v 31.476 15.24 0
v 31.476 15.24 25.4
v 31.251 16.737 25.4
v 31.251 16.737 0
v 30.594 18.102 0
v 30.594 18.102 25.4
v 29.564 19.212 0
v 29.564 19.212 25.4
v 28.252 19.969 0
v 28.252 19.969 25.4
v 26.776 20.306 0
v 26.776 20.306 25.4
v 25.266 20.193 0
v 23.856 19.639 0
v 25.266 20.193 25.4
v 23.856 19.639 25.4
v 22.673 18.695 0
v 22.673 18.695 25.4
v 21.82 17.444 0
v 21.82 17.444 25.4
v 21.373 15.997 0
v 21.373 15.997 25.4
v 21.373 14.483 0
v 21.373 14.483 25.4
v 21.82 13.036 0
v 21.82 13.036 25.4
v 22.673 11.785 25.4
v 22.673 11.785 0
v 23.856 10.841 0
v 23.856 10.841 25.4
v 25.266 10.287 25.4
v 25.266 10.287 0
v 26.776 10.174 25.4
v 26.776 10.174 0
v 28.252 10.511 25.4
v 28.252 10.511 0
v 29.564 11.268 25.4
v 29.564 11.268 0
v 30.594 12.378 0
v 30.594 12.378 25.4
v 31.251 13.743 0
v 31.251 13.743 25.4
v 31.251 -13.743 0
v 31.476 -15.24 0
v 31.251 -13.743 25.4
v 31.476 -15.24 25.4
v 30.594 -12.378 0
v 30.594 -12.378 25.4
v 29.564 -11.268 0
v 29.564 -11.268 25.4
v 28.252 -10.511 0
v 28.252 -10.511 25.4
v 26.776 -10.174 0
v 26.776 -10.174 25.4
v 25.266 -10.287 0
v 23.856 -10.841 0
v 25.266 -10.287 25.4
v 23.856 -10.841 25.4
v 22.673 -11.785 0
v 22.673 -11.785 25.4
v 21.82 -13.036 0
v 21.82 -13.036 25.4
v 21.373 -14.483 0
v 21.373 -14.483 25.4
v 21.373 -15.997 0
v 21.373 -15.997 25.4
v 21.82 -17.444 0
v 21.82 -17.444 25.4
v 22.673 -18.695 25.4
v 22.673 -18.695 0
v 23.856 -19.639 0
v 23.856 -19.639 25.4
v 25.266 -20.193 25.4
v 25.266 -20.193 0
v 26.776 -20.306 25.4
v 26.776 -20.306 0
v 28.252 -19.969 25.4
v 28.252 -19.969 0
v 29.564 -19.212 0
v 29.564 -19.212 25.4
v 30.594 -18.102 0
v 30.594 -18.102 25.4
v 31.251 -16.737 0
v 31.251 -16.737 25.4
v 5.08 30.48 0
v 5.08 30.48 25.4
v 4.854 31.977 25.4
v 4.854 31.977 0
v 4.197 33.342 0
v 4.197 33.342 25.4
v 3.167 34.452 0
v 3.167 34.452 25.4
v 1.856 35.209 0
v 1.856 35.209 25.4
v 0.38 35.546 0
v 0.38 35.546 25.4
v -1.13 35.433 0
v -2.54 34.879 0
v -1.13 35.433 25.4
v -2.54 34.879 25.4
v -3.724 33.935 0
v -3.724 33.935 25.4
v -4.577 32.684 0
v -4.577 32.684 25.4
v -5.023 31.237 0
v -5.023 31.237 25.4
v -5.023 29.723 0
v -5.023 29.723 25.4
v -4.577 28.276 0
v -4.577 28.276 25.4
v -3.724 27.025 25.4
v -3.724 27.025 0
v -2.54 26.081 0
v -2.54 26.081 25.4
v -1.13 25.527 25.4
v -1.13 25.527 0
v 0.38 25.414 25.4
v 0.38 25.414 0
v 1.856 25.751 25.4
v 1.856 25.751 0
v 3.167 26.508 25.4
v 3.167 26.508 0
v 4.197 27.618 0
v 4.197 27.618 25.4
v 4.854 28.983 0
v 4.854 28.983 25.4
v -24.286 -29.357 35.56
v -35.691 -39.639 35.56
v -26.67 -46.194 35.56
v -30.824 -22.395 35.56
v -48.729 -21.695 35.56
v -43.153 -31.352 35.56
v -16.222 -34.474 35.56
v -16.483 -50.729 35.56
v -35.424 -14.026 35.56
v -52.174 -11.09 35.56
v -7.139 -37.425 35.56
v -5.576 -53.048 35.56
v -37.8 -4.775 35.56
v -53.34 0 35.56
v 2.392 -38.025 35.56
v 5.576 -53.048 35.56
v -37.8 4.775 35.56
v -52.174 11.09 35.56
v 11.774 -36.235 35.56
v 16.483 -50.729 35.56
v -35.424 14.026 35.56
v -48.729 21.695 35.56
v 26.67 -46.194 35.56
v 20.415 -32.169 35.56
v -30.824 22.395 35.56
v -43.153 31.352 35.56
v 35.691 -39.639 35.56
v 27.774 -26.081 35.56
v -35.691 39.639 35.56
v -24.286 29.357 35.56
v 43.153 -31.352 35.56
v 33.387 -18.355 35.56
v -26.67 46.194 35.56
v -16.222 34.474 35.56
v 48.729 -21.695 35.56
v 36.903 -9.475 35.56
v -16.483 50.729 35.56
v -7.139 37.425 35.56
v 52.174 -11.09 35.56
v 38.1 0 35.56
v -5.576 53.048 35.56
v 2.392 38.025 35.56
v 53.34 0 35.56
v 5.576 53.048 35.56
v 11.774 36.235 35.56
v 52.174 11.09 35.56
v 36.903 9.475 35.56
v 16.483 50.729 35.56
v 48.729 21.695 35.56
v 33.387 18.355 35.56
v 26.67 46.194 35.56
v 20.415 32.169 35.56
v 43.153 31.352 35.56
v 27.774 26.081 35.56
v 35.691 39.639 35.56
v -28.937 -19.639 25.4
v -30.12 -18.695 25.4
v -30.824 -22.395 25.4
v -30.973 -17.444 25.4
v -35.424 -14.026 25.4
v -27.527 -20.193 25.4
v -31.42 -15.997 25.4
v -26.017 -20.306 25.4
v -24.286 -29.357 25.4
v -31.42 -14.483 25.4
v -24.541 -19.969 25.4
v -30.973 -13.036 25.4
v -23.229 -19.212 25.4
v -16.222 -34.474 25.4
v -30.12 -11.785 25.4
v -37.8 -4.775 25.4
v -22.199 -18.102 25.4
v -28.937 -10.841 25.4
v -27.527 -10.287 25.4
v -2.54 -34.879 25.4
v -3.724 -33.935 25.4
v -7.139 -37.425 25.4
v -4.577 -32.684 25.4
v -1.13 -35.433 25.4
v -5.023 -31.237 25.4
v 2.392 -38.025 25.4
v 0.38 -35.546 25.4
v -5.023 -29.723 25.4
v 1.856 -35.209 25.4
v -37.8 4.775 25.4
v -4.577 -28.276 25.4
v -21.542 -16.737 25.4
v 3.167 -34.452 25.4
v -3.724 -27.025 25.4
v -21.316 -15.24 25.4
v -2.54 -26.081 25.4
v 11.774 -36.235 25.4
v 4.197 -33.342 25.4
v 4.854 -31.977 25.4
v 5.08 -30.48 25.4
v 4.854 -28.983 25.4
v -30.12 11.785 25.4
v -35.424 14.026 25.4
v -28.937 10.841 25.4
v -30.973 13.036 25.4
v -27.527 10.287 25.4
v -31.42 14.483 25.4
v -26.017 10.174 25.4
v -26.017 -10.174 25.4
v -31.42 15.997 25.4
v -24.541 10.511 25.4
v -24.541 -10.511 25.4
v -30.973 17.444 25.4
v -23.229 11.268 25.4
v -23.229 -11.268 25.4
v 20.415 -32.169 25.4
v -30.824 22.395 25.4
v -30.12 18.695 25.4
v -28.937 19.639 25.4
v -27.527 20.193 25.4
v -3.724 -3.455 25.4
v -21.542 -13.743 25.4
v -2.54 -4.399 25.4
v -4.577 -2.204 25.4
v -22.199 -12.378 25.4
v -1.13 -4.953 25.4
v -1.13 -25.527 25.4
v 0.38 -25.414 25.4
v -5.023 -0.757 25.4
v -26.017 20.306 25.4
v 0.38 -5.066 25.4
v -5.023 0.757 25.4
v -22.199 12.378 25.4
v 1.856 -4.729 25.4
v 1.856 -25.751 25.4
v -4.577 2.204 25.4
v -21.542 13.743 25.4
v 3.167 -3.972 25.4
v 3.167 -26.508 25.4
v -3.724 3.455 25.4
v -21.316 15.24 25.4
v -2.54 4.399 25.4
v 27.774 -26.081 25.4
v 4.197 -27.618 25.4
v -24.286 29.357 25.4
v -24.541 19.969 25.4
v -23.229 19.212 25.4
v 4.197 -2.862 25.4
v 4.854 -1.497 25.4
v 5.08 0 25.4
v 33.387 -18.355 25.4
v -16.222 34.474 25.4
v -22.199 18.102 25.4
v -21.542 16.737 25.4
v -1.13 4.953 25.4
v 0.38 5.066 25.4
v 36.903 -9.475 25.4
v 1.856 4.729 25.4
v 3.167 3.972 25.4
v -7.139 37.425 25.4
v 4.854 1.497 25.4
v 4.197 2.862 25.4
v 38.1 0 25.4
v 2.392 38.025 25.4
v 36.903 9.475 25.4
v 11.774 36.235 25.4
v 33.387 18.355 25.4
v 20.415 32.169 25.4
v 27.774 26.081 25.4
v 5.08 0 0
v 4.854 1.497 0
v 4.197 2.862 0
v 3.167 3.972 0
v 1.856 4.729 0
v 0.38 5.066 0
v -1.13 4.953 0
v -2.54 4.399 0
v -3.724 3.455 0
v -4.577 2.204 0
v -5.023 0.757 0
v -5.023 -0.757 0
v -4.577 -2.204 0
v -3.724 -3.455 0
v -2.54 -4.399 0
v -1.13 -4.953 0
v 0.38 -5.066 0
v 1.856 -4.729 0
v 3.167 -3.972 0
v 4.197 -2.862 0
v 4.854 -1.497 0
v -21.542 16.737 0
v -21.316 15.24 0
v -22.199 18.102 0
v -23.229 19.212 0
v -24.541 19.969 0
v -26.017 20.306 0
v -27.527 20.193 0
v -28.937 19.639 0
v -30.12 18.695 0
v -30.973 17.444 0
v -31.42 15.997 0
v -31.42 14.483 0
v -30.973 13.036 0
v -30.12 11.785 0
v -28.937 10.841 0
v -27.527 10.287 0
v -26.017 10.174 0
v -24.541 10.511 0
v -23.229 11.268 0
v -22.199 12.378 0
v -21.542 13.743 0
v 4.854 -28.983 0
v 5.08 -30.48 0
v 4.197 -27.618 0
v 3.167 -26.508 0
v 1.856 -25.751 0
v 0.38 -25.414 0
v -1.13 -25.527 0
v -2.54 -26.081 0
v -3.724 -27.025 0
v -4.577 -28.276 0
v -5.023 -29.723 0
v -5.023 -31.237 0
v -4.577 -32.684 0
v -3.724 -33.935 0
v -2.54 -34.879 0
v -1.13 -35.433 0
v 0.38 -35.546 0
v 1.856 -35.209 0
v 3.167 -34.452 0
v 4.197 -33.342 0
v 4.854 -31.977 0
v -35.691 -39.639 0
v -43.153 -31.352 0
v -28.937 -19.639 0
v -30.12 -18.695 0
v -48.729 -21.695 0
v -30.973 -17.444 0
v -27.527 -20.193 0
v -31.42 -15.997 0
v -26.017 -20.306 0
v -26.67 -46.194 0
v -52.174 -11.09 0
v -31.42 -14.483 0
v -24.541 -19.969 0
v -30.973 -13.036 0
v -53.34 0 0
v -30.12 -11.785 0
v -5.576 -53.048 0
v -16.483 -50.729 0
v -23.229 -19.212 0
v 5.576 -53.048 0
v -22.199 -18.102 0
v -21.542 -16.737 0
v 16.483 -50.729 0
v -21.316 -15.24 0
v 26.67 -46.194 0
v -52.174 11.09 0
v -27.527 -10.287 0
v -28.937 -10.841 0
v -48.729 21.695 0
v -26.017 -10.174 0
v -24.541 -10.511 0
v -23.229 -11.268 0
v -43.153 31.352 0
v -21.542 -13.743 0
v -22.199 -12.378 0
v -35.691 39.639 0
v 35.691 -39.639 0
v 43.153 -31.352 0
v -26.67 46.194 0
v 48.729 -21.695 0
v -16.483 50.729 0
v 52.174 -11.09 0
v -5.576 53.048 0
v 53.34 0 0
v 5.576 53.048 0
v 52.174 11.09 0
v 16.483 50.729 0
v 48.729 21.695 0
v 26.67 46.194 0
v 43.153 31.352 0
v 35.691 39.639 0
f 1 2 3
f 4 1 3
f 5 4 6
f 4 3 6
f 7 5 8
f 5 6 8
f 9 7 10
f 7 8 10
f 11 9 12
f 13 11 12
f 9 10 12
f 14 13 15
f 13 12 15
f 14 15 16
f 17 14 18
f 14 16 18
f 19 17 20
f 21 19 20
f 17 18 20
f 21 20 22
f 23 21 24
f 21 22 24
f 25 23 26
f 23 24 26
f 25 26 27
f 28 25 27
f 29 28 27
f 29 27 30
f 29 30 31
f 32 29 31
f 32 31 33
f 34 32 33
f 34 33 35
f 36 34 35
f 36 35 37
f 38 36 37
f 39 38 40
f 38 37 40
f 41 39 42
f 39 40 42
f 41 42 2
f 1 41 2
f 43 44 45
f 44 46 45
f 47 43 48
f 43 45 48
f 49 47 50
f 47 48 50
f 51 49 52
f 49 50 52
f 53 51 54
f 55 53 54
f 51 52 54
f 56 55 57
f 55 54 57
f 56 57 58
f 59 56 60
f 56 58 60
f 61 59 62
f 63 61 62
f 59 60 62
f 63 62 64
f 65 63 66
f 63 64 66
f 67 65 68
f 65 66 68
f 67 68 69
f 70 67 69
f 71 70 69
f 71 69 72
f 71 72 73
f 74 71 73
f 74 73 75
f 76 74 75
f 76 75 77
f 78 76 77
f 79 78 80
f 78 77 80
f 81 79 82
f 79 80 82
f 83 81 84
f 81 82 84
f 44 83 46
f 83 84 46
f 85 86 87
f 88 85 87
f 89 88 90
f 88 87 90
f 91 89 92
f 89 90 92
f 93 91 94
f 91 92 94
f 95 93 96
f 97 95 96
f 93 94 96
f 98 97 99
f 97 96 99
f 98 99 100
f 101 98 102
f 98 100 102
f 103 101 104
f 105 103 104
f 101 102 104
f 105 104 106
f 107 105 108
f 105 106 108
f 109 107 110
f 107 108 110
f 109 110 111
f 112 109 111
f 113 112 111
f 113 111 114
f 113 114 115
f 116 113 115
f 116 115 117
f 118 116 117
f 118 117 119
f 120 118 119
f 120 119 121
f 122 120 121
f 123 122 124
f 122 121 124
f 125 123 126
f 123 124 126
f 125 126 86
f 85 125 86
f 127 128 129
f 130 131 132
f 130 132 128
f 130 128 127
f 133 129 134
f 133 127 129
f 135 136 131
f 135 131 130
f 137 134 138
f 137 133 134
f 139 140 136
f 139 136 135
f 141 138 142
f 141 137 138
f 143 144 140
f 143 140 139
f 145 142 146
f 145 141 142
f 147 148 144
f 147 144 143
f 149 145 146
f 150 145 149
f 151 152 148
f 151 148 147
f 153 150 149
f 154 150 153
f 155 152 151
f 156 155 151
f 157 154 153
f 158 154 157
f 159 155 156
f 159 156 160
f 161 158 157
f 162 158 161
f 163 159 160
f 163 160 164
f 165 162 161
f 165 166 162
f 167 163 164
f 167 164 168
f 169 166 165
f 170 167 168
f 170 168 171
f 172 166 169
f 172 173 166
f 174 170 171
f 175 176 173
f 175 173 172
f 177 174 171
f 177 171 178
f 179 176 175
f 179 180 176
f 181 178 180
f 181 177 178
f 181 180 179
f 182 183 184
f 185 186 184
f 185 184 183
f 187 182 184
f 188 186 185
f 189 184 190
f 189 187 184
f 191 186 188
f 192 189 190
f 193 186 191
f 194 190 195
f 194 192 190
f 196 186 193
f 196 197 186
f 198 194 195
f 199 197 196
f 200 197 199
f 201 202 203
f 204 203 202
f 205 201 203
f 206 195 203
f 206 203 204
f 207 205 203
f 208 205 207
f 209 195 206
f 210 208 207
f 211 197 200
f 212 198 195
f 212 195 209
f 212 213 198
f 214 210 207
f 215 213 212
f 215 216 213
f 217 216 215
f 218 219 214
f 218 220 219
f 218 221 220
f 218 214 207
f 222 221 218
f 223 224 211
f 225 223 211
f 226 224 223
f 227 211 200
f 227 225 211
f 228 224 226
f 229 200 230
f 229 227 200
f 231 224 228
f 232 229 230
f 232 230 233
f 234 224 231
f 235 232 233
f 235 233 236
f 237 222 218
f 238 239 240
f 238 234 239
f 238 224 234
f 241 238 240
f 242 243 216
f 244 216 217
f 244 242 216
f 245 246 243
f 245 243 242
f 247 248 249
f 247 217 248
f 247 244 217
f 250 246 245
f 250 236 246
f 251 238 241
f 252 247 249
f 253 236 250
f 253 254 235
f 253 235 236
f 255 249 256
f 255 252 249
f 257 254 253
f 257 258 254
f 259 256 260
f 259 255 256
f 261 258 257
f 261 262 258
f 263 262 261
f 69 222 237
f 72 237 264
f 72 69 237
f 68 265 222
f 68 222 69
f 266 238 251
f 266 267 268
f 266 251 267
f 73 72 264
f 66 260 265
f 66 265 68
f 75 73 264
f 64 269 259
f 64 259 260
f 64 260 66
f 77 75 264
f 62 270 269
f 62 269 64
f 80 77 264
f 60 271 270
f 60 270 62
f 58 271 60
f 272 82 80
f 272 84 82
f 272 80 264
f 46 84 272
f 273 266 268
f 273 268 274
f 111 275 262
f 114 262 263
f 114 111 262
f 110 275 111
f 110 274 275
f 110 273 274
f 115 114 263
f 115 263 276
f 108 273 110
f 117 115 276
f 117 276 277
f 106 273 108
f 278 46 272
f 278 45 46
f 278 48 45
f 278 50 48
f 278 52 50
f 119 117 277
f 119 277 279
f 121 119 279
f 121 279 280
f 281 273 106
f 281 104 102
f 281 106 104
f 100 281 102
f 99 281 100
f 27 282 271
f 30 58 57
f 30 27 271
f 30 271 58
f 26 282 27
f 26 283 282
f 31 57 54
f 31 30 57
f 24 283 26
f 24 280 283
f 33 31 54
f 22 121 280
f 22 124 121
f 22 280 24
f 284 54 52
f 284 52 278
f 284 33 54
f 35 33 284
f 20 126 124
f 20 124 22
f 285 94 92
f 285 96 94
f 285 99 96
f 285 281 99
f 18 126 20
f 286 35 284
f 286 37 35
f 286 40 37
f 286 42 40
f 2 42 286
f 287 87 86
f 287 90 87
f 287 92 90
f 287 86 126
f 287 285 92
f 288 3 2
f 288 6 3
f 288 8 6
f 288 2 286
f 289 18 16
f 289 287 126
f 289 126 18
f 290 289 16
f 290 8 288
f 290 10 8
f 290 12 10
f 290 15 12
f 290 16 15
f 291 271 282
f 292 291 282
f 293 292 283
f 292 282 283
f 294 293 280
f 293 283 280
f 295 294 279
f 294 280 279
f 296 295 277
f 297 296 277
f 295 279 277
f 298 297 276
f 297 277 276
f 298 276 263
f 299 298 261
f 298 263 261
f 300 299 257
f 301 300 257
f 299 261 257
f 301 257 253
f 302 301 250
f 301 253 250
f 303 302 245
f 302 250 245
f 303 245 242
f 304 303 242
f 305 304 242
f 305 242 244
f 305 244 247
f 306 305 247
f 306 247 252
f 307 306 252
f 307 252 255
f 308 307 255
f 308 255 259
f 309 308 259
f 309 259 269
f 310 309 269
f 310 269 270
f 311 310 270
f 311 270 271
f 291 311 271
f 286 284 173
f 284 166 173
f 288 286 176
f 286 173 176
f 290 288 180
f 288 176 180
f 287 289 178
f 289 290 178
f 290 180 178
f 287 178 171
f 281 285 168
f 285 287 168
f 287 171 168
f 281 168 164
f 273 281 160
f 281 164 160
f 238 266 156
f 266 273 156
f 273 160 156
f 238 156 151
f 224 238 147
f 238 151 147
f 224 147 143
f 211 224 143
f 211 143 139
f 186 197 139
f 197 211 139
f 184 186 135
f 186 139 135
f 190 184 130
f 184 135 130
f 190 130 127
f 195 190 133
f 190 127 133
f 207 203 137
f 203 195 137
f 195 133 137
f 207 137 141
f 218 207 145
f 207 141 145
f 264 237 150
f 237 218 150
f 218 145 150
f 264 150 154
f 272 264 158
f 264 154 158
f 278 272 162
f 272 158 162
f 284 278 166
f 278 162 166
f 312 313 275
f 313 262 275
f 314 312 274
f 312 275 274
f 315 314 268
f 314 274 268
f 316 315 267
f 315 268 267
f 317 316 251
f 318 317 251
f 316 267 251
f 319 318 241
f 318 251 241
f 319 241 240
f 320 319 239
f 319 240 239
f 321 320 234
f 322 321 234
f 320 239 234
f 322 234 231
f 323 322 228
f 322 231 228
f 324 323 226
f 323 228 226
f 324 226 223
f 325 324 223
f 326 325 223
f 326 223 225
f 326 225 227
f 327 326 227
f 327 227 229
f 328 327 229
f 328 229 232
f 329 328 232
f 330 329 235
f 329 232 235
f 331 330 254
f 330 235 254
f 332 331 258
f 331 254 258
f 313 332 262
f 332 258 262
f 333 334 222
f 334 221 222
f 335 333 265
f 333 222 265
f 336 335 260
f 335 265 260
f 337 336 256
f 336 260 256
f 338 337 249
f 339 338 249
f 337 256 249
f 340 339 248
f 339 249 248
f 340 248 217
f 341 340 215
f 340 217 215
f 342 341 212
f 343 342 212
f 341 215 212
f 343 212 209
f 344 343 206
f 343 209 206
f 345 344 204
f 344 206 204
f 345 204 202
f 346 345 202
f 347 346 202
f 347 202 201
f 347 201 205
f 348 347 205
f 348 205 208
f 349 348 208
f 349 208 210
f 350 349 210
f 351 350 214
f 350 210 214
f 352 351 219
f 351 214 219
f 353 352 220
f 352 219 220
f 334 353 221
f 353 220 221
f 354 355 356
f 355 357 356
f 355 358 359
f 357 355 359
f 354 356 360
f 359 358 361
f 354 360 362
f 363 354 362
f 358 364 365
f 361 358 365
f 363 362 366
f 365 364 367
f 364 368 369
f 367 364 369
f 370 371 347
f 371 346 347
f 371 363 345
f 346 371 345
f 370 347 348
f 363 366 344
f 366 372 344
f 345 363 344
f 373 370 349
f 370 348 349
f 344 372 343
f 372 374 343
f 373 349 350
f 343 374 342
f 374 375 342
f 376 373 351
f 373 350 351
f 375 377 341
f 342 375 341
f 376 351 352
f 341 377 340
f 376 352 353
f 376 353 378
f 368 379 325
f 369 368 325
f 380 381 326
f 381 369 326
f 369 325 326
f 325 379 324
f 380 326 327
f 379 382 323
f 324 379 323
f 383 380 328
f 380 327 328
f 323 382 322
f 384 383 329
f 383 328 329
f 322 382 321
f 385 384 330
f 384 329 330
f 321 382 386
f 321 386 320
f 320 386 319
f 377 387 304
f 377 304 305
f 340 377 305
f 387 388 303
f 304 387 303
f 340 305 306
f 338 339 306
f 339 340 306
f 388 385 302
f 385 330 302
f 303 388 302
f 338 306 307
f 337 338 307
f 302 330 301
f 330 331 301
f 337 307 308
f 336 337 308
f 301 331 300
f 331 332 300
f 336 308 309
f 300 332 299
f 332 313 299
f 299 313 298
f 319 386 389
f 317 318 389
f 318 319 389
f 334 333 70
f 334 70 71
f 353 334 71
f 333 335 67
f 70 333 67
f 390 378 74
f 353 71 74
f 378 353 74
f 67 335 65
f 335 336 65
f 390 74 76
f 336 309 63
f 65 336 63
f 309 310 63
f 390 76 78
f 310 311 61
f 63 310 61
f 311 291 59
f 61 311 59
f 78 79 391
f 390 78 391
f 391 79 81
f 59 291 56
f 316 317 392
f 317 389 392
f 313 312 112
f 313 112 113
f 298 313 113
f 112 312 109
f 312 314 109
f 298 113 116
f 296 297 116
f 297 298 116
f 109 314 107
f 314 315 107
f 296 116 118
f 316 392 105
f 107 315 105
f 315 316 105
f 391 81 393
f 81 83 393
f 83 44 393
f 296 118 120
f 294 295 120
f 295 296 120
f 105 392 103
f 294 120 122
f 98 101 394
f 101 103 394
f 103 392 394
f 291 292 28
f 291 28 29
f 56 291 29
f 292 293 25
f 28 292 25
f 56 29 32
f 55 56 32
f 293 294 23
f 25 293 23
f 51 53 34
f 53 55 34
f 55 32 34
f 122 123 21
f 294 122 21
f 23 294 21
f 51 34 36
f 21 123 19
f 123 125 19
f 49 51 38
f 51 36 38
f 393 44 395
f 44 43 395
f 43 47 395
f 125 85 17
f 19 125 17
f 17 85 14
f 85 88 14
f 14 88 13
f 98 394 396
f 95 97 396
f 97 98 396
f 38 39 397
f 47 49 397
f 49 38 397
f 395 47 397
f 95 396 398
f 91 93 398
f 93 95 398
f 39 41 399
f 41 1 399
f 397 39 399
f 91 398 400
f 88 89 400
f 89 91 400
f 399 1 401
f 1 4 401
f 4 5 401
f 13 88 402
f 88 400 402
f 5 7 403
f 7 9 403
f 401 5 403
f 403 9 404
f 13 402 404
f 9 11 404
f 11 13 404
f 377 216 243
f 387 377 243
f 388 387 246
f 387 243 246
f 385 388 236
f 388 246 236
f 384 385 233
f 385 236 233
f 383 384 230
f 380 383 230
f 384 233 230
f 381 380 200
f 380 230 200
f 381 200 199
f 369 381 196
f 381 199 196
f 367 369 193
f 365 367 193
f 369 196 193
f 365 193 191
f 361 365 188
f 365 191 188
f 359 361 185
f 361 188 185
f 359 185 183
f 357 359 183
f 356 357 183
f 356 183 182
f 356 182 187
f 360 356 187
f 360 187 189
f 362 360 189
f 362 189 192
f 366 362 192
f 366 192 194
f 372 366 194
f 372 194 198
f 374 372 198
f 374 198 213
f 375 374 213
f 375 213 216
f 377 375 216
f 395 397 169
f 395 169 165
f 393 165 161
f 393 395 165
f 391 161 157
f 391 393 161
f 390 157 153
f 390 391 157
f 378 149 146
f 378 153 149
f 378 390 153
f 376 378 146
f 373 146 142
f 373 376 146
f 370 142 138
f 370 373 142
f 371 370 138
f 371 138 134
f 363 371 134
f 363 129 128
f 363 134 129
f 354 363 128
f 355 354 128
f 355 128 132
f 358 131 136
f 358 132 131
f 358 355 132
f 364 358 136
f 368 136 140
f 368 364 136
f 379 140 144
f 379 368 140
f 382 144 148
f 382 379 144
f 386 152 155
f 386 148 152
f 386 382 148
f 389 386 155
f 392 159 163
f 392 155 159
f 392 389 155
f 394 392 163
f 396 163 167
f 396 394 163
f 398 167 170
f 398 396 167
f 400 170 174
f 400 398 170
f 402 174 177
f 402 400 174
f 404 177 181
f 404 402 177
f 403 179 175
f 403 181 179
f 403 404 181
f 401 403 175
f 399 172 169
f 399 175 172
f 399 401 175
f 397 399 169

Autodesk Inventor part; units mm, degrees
ref_plane "YZ Plane" through (0, 0, 0) normal (1, 0, 0) x (0, 1, 0)
ref_plane "XZ Plane" through (0, 0, 0) normal (0, 1, 0) x (-1, 0, 0)
ref_plane "XY Plane" through (0, 0, 0) normal (0, 0, 1) x (1, 0, 0)
sketch "Sketch1" plane through (0, 0, 0) normal (0, 0, 1) x (1, 0, 0)
  circle A0 centre (0, 0) radius 53.34
  dimension "d0" = 106.68
extrude "Extrusion1" add sketch "Sketch1" along normal blind 35.56
sketch "Sketch2" plane through (0, 0, 35.56) normal (0, 0, 1) x (1, 0, 0)
  circle A0 centre (0, 0) radius 38.1
  dimension "d3" = 76.2
extrude "Extrusion2" cut sketch "Sketch2" against normal blind 10.16
sketch "Sketch3" plane through (0, 0, 25.4) normal (0, 0, 1) x (1, 0, 0)
  line L0 (-74.676, 0) -> (74.676, 0) construction
  line L1 (0, -74.676) -> (0, 74.676) construction
  circle A0 centre (0, 0) radius 30.48
  circle A1 centre (0, 30.48) radius 5.08
  circle A2 centre (-26.3965, 15.24) radius 5.08
  circle A3 centre (-26.3965, -15.24) radius 5.08
  circle A4 centre (0, -30.48) radius 5.08
  circle A5 centre (26.3965, -15.24) radius 5.08
  circle A6 centre (26.3965, 15.24) radius 5.08
  circle A7 centre (0, 0) radius 5.08
  dimension "d6" = 60.96
  dimension "d7" = 10.16
  dimension "d10" = 360
  dimension "d14" = 10.16
extrude "Extrusion3" cut sketch "Sketch3" against normal through all contours A6 A0 | A0 A6 | A5 A0 | A0 A5 | A1 A0 | A0 A1 | A4 A0 | A0 A4 | A2 A0 | A0 A2 | A3 A0 | A0 A3 | A7
sketch "Sketch4" plane through (0, 0, 0) normal (1, 0, 0) x (0, 1, 0)
  line L0 (-38.1, 25.4) -> (38.1, 25.4) projected
  line L1 (53.34, 35.56) -> (-53.34, 35.56) projected
  line L2 (53.34, 0) -> (-53.34, 0) projected
  line L3 (-5.08, 25.4) -> (-5.08, 0) projected
  line L4 (-5.08, 0) -> (-25.4, 0) projected
  line L5 (-25.4, 0) -> (-25.4, 25.4) projected
  line L6 (-25.4, 25.4) -> (-5.08, 25.4) projected
  line L7 (5.08, 0) -> (5.08, 25.4) projected
  line L8 (5.08, 25.4) -> (25.4, 25.4) projected
  line L9 (25.4, 25.4) -> (25.4, 0) projected
  line L10 (25.4, 0) -> (5.08, 0) projected
  line L11 (53.34, 35.56) -> (53.34, 0) projected
  line L12 (53.34, 0) -> (35.56, 0) projected
  line L13 (35.56, 0) -> (35.56, 25.4) projected
  line L14 (35.56, 25.4) -> (38.1, 25.4) projected
  line L15 (38.1, 25.4) -> (38.1, 35.56) projected
  line L16 (38.1, 35.56) -> (53.34, 35.56) projected
  line L17 (-53.34, 0) -> (-53.34, 35.56) projected
  line L18 (-53.34, 35.56) -> (-38.1, 35.56) projected
  line L19 (-38.1, 35.56) -> (-38.1, 25.4) projected
  line L20 (-38.1, 25.4) -> (-35.56, 25.4) projected
  line L21 (-35.56, 25.4) -> (-35.56, 0) projected
  line L22 (-35.56, 0) -> (-53.34, 0) projected
  line L23 (-5.08, 25.4) -> (-5.08, 0) projected
  line L24 (-5.08, 0) -> (-25.4, 0) projected
  line L25 (-25.4, 0) -> (-25.4, 25.4) projected
  line L26 (-25.4, 25.4) -> (-5.08, 25.4) projected
  line L27 (5.08, 0) -> (5.08, 25.4) projected
  line L28 (5.08, 25.4) -> (25.4, 25.4) projected
  line L29 (25.4, 25.4) -> (25.4, 0) projected
  line L30 (25.4, 0) -> (5.08, 0) projected
  line L31 (53.34, 35.56) -> (53.34, 0) projected
  line L32 (53.34, 0) -> (35.56, 0) projected
  line L33 (35.56, 0) -> (35.56, 25.4) projected
  line L34 (35.56, 25.4) -> (38.1, 25.4) projected
  line L35 (38.1, 25.4) -> (38.1, 35.56) projected
  line L36 (38.1, 35.56) -> (53.34, 35.56) projected
  line L37 (-53.34, 0) -> (-53.34, 35.56) projected
  line L38 (-53.34, 35.56) -> (-38.1, 35.56) projected
  line L39 (-38.1, 35.56) -> (-38.1, 25.4) projected
  line L40 (-38.1, 25.4) -> (-35.56, 25.4) projected
  line L41 (-35.56, 25.4) -> (-35.56, 0) projected
  line L42 (-35.56, 0) -> (-53.34, 0) projected
  line L43 (-5.08, 25.4) -> (-5.08, 0) projected
  line L44 (-5.08, 0) -> (-25.4, 0) projected
  line L45 (-25.4, 0) -> (-25.4, 25.4) projected
  line L46 (-25.4, 25.4) -> (-5.08, 25.4) projected
  line L47 (5.08, 0) -> (5.08, 25.4) projected
  line L48 (5.08, 25.4) -> (25.4, 25.4) projected
  line L49 (25.4, 25.4) -> (25.4, 0) projected
  line L50 (25.4, 0) -> (5.08, 0) projected
  line L51 (53.34, 35.56) -> (53.34, 0) projected
  line L52 (53.34, 0) -> (35.56, 0) projected
  line L53 (35.56, 0) -> (35.56, 25.4) projected
  line L54 (35.56, 25.4) -> (38.1, 25.4) projected
  line L55 (38.1, 25.4) -> (38.1, 35.56) projected
  line L56 (38.1, 35.56) -> (53.34, 35.56) projected
  line L57 (-53.34, 0) -> (-53.34, 35.56) projected
  line L58 (-53.34, 35.56) -> (-38.1, 35.56) projected
  line L59 (-38.1, 35.56) -> (-38.1, 25.4) projected
  line L60 (-38.1, 25.4) -> (-35.56, 25.4) projected
  line L61 (-35.56, 25.4) -> (-35.56, 0) projected
  line L62 (-35.56, 0) -> (-53.34, 0) projected
  line L63 (53.34, 35.56) -> (-53.34, 35.56) projected
  line L64 (53.34, 0) -> (-53.34, 0) projected
  line L65 (53.34, 0) -> (-53.34, 0) construction
  line L66 (12.7, 0) -> (12.7, 35.56) construction
  line L67 (-12.7, 0) -> (-12.7, 35.56) construction
  line L68 (0, -7.112) -> (0, 42.672) projected
  line L69 (48.26, 0) -> (12.7, 0)
  line L70 (12.7, 0) -> (12.7, 10.16)
  line L71 (12.7, 10.16) -> (48.26, 10.16)
  line L72 (48.26, 10.16) -> (48.26, 0)
  point P0 (0, 0)
  point P1 (0, 35.56)
  point P2 (0, 25.4)
  dimension "d15" = 25.4
  dimension "d16" = 10.16
  dimension "d17" = 5.08
  dimension "d18" = 7.62
revolve "Revolution1" cut sketch "Sketch4" angle 360 about axis through (0, 0, -10) along (0, 0, 1) contours L1 L15 L0 L68
equation "\"BendRadius\" = Thickness"
equation "\"BendReliefWidth\" = Thickness"
equation "\"BendReliefDepth\" = 0.5 * Thickness"
equation "\"CornerReliefSize\" = 4 * Thickness"
equation "\"MinimumRemnant\" = 2 * Thickness"
equation "\"TransitionRadius\" = BendRadius"
equation "\"JacobiRadiusSize\" = BendRadius"
equation "\"GapSize\" = Thickness"
equation "\"Thickness\" = 3.048"
properties part number "valve" material "Brass, Soft Yellow"
